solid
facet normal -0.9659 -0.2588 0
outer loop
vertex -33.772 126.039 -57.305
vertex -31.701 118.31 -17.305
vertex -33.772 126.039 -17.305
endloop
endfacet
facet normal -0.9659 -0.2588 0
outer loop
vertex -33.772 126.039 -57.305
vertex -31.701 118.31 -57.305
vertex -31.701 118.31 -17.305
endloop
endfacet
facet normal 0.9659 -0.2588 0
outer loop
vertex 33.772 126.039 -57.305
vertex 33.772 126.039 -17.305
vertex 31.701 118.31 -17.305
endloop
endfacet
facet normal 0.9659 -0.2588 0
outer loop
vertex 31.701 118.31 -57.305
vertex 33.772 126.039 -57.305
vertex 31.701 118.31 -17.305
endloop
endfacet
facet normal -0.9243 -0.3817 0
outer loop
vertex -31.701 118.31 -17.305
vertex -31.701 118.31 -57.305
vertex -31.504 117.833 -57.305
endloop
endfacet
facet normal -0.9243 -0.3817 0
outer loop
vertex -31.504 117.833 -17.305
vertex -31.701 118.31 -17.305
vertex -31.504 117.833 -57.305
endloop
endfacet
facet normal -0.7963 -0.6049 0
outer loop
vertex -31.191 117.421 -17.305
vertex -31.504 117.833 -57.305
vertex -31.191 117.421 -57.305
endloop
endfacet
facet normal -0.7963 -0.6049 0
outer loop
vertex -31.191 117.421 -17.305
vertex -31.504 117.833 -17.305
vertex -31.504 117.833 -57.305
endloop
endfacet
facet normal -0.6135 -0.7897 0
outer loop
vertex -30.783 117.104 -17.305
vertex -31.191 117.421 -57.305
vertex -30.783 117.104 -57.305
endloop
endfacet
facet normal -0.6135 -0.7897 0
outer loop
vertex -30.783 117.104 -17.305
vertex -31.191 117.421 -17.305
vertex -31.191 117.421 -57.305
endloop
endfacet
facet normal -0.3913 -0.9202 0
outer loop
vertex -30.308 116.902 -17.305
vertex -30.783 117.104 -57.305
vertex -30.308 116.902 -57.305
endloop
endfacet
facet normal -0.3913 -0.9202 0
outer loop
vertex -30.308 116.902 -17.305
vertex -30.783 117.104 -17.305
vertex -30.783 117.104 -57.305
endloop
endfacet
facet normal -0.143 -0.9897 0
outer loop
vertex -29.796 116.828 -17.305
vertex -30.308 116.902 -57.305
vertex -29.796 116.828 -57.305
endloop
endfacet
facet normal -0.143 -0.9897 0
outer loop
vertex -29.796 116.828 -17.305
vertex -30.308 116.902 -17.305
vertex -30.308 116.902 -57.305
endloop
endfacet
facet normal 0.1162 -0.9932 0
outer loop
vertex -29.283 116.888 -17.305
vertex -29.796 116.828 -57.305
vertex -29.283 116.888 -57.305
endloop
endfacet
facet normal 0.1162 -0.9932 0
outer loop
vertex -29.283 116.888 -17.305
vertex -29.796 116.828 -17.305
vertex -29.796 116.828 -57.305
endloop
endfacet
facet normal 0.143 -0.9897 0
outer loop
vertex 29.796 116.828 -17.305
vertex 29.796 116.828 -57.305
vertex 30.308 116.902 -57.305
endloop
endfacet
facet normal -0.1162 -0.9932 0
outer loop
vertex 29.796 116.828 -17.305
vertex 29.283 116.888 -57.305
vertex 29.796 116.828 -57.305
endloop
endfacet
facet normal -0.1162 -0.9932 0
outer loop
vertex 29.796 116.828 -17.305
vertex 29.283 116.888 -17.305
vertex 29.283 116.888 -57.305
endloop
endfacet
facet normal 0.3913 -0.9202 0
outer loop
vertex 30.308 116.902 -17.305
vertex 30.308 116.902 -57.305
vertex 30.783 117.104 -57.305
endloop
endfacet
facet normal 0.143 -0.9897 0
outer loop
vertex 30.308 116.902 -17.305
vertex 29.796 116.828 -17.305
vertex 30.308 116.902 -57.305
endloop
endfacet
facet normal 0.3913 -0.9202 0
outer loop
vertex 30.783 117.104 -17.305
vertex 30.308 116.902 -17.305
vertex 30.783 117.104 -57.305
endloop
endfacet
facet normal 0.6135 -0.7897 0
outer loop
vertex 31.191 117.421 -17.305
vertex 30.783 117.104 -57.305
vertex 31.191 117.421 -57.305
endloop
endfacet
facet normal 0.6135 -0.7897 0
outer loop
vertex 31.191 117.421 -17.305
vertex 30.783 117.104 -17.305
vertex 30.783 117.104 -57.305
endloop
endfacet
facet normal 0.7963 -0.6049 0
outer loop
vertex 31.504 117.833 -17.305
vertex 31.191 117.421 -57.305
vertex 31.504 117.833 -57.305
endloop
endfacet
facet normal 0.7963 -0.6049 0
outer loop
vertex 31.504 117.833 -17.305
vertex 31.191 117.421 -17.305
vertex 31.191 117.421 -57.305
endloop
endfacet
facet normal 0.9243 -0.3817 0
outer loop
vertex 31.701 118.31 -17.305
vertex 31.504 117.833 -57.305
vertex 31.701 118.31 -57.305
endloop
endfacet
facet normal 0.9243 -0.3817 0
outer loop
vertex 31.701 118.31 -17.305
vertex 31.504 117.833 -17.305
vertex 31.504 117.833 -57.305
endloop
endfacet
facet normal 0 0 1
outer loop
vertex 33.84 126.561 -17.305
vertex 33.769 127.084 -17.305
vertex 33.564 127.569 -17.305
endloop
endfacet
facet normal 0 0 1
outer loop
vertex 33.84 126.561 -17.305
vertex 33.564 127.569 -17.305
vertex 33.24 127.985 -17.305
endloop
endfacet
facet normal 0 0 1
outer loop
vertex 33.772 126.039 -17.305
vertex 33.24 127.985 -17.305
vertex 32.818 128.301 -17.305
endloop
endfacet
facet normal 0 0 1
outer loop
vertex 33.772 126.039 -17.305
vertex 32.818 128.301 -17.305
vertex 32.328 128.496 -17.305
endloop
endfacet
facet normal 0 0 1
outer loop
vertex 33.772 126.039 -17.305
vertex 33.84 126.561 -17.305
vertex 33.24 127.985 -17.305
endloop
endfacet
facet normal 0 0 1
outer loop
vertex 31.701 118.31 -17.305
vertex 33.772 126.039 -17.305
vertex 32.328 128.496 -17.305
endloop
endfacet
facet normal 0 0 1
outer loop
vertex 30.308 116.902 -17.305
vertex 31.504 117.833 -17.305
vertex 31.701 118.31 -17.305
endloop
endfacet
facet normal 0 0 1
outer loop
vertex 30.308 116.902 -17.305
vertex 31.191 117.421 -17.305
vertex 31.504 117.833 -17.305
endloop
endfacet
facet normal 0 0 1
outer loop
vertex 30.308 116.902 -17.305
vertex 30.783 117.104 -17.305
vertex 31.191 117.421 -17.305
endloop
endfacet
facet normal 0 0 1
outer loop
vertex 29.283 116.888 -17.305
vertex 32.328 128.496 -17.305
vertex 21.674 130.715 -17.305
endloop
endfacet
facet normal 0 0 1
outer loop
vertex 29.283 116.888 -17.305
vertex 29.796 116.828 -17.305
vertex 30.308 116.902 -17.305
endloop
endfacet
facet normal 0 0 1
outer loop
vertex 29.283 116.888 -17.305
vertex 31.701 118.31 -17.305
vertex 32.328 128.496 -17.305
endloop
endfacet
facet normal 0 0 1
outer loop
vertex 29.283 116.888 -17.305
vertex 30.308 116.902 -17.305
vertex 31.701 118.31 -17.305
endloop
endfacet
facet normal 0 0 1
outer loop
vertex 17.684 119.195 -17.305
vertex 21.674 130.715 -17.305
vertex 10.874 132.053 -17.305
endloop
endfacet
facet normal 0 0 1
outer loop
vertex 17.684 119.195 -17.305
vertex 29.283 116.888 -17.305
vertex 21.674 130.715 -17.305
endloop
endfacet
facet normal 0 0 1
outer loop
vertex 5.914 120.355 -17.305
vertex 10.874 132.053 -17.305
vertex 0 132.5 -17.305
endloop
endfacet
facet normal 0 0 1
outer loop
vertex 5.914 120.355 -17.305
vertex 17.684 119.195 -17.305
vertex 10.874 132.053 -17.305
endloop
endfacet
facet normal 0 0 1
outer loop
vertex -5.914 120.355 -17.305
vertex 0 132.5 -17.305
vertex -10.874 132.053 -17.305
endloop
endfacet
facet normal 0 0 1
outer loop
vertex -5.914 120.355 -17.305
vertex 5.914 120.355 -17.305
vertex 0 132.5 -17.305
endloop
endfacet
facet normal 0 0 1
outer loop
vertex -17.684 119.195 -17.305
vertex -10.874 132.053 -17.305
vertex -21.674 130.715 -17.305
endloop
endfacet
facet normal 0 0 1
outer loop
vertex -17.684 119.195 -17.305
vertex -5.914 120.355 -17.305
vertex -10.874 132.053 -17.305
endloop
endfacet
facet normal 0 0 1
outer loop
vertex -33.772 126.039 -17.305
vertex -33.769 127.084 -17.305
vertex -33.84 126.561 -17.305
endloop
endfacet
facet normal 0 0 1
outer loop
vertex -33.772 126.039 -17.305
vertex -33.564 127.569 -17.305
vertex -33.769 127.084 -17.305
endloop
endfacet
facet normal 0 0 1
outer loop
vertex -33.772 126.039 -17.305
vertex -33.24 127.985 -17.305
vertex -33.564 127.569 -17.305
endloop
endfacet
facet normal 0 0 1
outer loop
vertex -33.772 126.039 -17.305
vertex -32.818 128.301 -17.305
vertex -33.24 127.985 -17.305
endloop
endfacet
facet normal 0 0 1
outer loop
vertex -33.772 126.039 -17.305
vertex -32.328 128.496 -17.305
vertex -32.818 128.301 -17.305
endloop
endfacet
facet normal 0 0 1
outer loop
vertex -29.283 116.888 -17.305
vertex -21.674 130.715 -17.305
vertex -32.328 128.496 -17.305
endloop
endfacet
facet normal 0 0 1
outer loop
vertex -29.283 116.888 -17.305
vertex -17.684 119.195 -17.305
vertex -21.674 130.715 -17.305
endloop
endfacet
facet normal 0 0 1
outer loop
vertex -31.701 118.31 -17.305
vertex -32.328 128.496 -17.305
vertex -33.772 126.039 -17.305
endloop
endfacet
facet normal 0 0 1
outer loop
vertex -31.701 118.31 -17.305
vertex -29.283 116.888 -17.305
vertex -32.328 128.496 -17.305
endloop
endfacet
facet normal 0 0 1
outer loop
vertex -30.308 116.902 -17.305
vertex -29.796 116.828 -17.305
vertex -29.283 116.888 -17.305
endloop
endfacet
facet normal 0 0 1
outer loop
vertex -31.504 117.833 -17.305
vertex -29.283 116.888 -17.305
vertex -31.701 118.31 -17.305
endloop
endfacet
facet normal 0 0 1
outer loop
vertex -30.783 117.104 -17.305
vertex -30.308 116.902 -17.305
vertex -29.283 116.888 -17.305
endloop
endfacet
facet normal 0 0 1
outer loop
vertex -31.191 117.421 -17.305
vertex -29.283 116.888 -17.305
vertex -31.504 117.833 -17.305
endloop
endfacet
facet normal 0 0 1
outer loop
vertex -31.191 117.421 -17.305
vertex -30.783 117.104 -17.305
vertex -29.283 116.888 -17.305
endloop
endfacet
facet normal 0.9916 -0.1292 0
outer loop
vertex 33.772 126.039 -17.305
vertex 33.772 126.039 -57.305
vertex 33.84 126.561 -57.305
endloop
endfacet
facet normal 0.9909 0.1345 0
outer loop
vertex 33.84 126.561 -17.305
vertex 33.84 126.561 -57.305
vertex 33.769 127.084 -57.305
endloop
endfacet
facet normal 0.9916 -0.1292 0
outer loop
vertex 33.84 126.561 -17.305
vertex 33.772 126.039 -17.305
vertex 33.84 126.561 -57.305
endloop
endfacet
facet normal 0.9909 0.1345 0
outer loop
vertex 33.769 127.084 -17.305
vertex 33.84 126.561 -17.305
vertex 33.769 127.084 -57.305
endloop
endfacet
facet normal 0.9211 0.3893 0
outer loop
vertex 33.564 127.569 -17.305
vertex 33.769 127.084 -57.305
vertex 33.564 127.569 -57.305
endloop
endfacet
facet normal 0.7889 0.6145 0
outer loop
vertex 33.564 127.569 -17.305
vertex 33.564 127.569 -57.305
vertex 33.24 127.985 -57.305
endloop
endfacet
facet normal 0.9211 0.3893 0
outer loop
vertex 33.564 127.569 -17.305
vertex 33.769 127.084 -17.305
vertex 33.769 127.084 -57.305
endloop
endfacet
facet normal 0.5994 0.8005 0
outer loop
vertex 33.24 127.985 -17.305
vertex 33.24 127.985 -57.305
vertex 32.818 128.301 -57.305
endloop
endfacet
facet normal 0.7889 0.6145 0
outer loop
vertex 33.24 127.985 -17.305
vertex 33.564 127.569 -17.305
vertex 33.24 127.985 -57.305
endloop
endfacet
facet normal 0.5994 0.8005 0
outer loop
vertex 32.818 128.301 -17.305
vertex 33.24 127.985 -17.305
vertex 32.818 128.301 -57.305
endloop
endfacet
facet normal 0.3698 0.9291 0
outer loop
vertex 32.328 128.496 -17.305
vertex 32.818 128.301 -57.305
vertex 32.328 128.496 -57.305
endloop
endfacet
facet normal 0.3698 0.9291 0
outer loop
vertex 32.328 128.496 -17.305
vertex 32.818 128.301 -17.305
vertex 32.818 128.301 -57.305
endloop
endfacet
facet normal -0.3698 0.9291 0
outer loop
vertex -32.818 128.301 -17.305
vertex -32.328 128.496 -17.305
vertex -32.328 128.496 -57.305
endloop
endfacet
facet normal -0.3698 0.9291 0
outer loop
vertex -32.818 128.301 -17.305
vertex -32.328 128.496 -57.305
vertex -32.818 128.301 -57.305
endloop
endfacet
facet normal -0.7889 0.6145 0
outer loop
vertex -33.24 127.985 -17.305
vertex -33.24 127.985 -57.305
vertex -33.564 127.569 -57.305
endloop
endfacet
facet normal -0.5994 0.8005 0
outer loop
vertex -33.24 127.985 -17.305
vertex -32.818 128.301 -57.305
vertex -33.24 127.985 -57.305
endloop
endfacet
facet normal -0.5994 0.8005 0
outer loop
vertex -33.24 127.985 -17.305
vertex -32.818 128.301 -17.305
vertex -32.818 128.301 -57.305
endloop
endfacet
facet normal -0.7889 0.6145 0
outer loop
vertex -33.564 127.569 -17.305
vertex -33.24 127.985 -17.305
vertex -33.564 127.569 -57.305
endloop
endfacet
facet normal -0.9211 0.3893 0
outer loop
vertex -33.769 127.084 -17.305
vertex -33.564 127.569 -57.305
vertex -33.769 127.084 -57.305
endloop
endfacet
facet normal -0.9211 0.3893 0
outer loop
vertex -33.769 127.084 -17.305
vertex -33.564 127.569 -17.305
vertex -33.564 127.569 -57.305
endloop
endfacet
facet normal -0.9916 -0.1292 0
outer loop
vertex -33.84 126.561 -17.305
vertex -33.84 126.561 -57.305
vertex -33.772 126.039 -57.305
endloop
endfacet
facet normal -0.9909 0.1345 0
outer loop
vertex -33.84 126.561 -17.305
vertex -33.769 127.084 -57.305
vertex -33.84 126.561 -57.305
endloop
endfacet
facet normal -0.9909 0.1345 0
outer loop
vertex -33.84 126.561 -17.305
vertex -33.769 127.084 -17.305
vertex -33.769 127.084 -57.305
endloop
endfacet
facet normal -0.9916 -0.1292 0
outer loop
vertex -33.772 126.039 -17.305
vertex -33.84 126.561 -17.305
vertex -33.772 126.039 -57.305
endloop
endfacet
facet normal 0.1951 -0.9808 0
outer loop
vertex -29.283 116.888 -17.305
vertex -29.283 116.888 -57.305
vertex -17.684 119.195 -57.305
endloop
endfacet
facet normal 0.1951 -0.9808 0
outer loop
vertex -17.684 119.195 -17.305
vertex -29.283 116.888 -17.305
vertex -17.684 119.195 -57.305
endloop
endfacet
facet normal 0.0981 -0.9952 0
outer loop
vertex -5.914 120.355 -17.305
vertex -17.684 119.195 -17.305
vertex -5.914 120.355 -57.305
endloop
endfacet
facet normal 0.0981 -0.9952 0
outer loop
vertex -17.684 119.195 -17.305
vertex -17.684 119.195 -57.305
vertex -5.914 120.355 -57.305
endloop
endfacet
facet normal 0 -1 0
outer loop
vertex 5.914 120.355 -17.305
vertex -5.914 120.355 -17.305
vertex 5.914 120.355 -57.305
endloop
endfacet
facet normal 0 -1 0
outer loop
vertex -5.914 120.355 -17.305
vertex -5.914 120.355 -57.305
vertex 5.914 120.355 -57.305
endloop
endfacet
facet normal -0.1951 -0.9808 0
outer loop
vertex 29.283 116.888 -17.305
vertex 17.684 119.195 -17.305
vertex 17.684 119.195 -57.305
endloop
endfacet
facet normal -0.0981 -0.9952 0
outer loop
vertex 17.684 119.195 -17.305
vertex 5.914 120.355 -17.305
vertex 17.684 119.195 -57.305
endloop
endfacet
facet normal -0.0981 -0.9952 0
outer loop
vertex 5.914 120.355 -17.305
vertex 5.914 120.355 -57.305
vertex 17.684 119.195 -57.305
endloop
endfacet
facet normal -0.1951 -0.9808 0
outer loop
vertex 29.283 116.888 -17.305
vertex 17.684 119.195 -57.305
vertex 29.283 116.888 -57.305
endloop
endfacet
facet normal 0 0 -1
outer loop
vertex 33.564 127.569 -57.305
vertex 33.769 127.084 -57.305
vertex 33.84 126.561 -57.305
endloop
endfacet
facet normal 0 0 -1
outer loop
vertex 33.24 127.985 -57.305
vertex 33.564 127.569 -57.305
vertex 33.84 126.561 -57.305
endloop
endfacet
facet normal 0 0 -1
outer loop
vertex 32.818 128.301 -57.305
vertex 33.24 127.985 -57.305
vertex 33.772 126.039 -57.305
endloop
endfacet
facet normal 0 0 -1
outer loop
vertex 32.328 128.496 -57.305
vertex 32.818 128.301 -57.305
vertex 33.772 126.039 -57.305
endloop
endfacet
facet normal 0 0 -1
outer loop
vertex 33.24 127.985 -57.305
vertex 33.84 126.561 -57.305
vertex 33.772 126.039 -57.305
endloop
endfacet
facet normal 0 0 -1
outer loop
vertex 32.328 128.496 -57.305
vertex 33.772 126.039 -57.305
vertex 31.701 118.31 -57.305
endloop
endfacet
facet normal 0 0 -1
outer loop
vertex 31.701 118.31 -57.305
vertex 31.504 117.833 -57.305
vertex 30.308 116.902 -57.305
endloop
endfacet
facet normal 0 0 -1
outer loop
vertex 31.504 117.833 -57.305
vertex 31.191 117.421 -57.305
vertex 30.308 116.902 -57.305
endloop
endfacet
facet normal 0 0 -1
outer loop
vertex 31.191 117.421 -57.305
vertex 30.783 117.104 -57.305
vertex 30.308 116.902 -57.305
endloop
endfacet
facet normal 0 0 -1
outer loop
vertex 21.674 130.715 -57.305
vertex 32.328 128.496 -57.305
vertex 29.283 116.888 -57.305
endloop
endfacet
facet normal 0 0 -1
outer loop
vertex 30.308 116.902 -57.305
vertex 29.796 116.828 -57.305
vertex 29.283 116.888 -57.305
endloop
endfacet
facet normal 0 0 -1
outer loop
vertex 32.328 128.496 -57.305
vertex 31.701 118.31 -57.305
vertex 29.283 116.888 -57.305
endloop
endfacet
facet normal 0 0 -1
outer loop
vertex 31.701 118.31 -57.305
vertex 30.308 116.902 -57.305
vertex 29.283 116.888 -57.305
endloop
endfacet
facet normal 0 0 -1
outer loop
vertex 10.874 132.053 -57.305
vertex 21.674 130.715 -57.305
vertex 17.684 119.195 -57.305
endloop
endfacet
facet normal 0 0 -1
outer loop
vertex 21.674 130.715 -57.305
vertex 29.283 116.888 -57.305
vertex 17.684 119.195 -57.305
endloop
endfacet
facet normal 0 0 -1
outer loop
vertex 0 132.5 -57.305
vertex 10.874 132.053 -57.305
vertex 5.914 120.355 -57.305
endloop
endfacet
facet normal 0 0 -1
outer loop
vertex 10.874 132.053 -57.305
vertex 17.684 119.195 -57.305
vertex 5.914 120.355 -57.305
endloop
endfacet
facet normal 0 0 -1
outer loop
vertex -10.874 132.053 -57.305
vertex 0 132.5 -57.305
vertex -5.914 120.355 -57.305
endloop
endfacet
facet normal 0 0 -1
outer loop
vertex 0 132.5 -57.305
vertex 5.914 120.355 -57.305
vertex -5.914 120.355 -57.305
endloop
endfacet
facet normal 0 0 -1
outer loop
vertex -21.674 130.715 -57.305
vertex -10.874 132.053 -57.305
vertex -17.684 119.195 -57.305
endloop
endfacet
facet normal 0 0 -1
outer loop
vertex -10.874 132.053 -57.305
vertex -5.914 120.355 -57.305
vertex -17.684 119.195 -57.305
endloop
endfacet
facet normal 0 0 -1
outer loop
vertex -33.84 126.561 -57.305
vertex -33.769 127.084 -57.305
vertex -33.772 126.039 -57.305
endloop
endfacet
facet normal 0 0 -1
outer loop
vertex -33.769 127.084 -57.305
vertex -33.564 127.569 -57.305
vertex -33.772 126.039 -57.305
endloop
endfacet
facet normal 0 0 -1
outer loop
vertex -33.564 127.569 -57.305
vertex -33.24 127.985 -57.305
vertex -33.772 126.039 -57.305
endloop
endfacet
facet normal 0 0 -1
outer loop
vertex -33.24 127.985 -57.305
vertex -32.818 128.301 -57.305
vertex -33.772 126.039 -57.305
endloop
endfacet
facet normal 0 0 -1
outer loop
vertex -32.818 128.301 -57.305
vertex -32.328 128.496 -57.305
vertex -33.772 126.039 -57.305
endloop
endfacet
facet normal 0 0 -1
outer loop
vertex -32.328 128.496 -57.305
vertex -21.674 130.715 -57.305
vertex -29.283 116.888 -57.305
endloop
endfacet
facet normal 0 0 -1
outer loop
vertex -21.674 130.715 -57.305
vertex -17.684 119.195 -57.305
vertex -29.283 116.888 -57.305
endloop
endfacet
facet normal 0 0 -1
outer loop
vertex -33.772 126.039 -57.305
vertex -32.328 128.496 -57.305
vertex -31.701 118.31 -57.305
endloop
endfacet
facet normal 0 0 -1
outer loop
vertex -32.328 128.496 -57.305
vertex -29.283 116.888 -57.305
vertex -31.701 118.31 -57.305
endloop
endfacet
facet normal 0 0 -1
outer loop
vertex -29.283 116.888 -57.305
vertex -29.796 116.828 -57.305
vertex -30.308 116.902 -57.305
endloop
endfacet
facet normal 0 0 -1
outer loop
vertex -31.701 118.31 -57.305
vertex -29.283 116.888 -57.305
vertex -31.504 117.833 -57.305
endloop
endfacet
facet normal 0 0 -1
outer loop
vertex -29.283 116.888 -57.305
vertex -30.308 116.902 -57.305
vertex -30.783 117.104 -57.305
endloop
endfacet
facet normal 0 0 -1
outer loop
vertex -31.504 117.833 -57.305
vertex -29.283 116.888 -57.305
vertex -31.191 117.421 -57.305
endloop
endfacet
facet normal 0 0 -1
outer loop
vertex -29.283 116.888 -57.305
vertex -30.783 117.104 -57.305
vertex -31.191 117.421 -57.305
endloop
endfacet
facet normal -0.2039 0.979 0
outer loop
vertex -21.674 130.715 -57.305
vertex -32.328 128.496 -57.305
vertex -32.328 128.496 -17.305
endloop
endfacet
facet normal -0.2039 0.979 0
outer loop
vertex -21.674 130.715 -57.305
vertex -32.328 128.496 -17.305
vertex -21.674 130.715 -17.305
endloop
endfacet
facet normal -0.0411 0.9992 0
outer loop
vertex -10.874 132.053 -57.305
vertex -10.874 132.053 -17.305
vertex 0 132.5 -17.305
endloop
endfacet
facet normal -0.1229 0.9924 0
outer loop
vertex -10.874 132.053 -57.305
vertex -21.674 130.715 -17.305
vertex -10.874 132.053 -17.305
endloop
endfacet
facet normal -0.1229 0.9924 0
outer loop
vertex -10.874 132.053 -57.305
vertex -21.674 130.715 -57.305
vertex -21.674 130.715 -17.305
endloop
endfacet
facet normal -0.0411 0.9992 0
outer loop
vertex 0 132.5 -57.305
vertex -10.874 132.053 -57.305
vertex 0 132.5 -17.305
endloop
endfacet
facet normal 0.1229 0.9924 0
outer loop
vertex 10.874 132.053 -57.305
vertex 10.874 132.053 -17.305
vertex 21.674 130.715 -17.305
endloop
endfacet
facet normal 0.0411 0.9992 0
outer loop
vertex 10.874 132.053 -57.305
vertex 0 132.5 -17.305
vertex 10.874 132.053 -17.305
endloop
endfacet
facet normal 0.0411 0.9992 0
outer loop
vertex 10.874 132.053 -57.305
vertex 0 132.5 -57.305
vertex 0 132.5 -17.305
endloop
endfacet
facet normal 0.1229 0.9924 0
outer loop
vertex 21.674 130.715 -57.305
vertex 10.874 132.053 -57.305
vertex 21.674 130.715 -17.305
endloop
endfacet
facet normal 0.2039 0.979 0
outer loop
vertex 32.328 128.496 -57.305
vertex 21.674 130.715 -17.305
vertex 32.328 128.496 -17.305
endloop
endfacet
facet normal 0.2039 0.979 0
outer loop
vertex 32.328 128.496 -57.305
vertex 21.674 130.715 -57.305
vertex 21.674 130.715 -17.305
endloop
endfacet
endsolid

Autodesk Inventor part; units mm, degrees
ref_plane "YZ Plane" through (0, 0, 0) normal (1, 0, 0) x (0, 1, 0)
ref_plane "XZ Plane" through (0, 0, 0) normal (0, 1, 0) x (-1, 0, 0)
ref_plane "РабПлоскость1" through (0, 0, -57.3048) normal (0, 0, 1) x (-1, 0, 0)
sketch "Эскиз1" plane through (0, 0, -57.3048) normal (0, 0, 1) x (-1, 0, 0)
  circle A0 centre (0, 0) radius 132.5 projected
  line L0 (31.1877, -116.3941) -> (34.2935, -127.9852) projected
  arc A1 (-31.1877, -116.3941) -> (31.1877, -116.3941) centre (0, 0) ccw projected
  line L1 (-34.2935, -127.9852) -> (-31.1877, -116.3941) projected
  point P0 (0, 0)
ref_plane "РабПлоскость2" through (-132.2012, -132.5, -3) normal (0, 0, -1) x (0, 1, 0)
extrude "Выдавливание1" add sketch "Эскиз1" along normal blind 40 contours L1 A1 L0 A0 picked at (24.6238, -125.9568)
fillet "Сопряжение1" radius 2 4 edges at (34.2935, 127.9852, -37.3048) (31.1877, 116.3941, -37.3048) (-31.1877, 116.3941, -37.3048) (-34.2935, 127.9852, -37.3048)
properties part number "Стойка"
